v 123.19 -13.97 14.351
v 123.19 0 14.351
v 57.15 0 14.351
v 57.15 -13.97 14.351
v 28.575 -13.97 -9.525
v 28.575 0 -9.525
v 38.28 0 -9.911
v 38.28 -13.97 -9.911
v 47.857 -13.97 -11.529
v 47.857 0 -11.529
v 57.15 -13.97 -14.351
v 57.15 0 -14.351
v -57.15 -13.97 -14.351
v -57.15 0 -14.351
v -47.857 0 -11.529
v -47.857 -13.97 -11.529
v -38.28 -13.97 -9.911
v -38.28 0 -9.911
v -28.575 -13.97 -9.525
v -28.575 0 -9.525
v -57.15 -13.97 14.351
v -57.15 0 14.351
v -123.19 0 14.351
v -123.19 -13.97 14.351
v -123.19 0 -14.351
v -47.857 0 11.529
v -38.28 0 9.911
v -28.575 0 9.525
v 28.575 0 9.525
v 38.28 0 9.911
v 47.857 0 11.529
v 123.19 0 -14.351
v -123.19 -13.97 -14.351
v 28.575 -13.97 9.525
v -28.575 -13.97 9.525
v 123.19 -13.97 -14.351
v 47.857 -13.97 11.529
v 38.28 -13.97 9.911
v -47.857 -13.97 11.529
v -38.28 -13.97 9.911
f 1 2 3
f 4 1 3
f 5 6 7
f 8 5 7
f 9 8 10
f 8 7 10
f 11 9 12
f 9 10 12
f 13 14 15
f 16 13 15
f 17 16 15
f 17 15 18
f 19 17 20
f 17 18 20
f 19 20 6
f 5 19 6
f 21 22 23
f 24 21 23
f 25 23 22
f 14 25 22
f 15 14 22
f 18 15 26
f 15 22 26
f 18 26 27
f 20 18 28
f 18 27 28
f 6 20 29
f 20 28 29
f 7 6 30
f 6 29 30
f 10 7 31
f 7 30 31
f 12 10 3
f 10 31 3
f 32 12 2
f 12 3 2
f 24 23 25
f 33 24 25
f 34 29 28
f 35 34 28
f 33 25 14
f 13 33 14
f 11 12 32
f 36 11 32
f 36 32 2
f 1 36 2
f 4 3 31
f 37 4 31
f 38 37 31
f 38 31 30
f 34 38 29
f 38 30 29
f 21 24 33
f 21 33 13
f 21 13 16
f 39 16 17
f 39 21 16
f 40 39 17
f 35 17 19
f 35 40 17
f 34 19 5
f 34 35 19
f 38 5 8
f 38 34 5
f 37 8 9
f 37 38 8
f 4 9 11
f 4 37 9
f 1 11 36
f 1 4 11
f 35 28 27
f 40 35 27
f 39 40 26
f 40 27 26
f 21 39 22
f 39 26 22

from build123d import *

# Parameters (mm, degrees)
F1_DEPTH = 13.97


with BuildPart() as f1:
    # F0 (on Front) → F1 (new body)
    with BuildSketch(Plane.XZ):
        with BuildLine():
            Line((28.575, 9.525), (0, 9.525))
            Line((0, 9.525), (-28.575, 9.525))
            ThreePointArc((-28.575, 9.525), (-43.094035, 10.567071), (-57.15, 14.351))
            Line((-57.15, 14.351), (-123.19, 14.351))
            Line((-123.19, 14.351), (-123.19, -14.351))
            Line((-123.19, -14.351), (-57.15, -14.351))
            ThreePointArc((-57.15, -14.351), (-43.094035, -10.567071), (-28.575, -9.525))
            Line((-28.575, -9.525), (0, -9.525))
            Line((0, -9.525), (28.575, -9.525))
            ThreePointArc((28.575, -9.525), (43.094035, -10.567071), (57.15, -14.351))
            Line((57.15, -14.351), (123.19, -14.351))
            Line((123.19, -14.351), (123.19, 14.351))
            Line((123.19, 14.351), (57.15, 14.351))
            ThreePointArc((57.15, 14.351), (43.094035, 10.567071), (28.575, 9.525))
        make_face()
    extrude(amount=F1_DEPTH)


solid = f1.part
